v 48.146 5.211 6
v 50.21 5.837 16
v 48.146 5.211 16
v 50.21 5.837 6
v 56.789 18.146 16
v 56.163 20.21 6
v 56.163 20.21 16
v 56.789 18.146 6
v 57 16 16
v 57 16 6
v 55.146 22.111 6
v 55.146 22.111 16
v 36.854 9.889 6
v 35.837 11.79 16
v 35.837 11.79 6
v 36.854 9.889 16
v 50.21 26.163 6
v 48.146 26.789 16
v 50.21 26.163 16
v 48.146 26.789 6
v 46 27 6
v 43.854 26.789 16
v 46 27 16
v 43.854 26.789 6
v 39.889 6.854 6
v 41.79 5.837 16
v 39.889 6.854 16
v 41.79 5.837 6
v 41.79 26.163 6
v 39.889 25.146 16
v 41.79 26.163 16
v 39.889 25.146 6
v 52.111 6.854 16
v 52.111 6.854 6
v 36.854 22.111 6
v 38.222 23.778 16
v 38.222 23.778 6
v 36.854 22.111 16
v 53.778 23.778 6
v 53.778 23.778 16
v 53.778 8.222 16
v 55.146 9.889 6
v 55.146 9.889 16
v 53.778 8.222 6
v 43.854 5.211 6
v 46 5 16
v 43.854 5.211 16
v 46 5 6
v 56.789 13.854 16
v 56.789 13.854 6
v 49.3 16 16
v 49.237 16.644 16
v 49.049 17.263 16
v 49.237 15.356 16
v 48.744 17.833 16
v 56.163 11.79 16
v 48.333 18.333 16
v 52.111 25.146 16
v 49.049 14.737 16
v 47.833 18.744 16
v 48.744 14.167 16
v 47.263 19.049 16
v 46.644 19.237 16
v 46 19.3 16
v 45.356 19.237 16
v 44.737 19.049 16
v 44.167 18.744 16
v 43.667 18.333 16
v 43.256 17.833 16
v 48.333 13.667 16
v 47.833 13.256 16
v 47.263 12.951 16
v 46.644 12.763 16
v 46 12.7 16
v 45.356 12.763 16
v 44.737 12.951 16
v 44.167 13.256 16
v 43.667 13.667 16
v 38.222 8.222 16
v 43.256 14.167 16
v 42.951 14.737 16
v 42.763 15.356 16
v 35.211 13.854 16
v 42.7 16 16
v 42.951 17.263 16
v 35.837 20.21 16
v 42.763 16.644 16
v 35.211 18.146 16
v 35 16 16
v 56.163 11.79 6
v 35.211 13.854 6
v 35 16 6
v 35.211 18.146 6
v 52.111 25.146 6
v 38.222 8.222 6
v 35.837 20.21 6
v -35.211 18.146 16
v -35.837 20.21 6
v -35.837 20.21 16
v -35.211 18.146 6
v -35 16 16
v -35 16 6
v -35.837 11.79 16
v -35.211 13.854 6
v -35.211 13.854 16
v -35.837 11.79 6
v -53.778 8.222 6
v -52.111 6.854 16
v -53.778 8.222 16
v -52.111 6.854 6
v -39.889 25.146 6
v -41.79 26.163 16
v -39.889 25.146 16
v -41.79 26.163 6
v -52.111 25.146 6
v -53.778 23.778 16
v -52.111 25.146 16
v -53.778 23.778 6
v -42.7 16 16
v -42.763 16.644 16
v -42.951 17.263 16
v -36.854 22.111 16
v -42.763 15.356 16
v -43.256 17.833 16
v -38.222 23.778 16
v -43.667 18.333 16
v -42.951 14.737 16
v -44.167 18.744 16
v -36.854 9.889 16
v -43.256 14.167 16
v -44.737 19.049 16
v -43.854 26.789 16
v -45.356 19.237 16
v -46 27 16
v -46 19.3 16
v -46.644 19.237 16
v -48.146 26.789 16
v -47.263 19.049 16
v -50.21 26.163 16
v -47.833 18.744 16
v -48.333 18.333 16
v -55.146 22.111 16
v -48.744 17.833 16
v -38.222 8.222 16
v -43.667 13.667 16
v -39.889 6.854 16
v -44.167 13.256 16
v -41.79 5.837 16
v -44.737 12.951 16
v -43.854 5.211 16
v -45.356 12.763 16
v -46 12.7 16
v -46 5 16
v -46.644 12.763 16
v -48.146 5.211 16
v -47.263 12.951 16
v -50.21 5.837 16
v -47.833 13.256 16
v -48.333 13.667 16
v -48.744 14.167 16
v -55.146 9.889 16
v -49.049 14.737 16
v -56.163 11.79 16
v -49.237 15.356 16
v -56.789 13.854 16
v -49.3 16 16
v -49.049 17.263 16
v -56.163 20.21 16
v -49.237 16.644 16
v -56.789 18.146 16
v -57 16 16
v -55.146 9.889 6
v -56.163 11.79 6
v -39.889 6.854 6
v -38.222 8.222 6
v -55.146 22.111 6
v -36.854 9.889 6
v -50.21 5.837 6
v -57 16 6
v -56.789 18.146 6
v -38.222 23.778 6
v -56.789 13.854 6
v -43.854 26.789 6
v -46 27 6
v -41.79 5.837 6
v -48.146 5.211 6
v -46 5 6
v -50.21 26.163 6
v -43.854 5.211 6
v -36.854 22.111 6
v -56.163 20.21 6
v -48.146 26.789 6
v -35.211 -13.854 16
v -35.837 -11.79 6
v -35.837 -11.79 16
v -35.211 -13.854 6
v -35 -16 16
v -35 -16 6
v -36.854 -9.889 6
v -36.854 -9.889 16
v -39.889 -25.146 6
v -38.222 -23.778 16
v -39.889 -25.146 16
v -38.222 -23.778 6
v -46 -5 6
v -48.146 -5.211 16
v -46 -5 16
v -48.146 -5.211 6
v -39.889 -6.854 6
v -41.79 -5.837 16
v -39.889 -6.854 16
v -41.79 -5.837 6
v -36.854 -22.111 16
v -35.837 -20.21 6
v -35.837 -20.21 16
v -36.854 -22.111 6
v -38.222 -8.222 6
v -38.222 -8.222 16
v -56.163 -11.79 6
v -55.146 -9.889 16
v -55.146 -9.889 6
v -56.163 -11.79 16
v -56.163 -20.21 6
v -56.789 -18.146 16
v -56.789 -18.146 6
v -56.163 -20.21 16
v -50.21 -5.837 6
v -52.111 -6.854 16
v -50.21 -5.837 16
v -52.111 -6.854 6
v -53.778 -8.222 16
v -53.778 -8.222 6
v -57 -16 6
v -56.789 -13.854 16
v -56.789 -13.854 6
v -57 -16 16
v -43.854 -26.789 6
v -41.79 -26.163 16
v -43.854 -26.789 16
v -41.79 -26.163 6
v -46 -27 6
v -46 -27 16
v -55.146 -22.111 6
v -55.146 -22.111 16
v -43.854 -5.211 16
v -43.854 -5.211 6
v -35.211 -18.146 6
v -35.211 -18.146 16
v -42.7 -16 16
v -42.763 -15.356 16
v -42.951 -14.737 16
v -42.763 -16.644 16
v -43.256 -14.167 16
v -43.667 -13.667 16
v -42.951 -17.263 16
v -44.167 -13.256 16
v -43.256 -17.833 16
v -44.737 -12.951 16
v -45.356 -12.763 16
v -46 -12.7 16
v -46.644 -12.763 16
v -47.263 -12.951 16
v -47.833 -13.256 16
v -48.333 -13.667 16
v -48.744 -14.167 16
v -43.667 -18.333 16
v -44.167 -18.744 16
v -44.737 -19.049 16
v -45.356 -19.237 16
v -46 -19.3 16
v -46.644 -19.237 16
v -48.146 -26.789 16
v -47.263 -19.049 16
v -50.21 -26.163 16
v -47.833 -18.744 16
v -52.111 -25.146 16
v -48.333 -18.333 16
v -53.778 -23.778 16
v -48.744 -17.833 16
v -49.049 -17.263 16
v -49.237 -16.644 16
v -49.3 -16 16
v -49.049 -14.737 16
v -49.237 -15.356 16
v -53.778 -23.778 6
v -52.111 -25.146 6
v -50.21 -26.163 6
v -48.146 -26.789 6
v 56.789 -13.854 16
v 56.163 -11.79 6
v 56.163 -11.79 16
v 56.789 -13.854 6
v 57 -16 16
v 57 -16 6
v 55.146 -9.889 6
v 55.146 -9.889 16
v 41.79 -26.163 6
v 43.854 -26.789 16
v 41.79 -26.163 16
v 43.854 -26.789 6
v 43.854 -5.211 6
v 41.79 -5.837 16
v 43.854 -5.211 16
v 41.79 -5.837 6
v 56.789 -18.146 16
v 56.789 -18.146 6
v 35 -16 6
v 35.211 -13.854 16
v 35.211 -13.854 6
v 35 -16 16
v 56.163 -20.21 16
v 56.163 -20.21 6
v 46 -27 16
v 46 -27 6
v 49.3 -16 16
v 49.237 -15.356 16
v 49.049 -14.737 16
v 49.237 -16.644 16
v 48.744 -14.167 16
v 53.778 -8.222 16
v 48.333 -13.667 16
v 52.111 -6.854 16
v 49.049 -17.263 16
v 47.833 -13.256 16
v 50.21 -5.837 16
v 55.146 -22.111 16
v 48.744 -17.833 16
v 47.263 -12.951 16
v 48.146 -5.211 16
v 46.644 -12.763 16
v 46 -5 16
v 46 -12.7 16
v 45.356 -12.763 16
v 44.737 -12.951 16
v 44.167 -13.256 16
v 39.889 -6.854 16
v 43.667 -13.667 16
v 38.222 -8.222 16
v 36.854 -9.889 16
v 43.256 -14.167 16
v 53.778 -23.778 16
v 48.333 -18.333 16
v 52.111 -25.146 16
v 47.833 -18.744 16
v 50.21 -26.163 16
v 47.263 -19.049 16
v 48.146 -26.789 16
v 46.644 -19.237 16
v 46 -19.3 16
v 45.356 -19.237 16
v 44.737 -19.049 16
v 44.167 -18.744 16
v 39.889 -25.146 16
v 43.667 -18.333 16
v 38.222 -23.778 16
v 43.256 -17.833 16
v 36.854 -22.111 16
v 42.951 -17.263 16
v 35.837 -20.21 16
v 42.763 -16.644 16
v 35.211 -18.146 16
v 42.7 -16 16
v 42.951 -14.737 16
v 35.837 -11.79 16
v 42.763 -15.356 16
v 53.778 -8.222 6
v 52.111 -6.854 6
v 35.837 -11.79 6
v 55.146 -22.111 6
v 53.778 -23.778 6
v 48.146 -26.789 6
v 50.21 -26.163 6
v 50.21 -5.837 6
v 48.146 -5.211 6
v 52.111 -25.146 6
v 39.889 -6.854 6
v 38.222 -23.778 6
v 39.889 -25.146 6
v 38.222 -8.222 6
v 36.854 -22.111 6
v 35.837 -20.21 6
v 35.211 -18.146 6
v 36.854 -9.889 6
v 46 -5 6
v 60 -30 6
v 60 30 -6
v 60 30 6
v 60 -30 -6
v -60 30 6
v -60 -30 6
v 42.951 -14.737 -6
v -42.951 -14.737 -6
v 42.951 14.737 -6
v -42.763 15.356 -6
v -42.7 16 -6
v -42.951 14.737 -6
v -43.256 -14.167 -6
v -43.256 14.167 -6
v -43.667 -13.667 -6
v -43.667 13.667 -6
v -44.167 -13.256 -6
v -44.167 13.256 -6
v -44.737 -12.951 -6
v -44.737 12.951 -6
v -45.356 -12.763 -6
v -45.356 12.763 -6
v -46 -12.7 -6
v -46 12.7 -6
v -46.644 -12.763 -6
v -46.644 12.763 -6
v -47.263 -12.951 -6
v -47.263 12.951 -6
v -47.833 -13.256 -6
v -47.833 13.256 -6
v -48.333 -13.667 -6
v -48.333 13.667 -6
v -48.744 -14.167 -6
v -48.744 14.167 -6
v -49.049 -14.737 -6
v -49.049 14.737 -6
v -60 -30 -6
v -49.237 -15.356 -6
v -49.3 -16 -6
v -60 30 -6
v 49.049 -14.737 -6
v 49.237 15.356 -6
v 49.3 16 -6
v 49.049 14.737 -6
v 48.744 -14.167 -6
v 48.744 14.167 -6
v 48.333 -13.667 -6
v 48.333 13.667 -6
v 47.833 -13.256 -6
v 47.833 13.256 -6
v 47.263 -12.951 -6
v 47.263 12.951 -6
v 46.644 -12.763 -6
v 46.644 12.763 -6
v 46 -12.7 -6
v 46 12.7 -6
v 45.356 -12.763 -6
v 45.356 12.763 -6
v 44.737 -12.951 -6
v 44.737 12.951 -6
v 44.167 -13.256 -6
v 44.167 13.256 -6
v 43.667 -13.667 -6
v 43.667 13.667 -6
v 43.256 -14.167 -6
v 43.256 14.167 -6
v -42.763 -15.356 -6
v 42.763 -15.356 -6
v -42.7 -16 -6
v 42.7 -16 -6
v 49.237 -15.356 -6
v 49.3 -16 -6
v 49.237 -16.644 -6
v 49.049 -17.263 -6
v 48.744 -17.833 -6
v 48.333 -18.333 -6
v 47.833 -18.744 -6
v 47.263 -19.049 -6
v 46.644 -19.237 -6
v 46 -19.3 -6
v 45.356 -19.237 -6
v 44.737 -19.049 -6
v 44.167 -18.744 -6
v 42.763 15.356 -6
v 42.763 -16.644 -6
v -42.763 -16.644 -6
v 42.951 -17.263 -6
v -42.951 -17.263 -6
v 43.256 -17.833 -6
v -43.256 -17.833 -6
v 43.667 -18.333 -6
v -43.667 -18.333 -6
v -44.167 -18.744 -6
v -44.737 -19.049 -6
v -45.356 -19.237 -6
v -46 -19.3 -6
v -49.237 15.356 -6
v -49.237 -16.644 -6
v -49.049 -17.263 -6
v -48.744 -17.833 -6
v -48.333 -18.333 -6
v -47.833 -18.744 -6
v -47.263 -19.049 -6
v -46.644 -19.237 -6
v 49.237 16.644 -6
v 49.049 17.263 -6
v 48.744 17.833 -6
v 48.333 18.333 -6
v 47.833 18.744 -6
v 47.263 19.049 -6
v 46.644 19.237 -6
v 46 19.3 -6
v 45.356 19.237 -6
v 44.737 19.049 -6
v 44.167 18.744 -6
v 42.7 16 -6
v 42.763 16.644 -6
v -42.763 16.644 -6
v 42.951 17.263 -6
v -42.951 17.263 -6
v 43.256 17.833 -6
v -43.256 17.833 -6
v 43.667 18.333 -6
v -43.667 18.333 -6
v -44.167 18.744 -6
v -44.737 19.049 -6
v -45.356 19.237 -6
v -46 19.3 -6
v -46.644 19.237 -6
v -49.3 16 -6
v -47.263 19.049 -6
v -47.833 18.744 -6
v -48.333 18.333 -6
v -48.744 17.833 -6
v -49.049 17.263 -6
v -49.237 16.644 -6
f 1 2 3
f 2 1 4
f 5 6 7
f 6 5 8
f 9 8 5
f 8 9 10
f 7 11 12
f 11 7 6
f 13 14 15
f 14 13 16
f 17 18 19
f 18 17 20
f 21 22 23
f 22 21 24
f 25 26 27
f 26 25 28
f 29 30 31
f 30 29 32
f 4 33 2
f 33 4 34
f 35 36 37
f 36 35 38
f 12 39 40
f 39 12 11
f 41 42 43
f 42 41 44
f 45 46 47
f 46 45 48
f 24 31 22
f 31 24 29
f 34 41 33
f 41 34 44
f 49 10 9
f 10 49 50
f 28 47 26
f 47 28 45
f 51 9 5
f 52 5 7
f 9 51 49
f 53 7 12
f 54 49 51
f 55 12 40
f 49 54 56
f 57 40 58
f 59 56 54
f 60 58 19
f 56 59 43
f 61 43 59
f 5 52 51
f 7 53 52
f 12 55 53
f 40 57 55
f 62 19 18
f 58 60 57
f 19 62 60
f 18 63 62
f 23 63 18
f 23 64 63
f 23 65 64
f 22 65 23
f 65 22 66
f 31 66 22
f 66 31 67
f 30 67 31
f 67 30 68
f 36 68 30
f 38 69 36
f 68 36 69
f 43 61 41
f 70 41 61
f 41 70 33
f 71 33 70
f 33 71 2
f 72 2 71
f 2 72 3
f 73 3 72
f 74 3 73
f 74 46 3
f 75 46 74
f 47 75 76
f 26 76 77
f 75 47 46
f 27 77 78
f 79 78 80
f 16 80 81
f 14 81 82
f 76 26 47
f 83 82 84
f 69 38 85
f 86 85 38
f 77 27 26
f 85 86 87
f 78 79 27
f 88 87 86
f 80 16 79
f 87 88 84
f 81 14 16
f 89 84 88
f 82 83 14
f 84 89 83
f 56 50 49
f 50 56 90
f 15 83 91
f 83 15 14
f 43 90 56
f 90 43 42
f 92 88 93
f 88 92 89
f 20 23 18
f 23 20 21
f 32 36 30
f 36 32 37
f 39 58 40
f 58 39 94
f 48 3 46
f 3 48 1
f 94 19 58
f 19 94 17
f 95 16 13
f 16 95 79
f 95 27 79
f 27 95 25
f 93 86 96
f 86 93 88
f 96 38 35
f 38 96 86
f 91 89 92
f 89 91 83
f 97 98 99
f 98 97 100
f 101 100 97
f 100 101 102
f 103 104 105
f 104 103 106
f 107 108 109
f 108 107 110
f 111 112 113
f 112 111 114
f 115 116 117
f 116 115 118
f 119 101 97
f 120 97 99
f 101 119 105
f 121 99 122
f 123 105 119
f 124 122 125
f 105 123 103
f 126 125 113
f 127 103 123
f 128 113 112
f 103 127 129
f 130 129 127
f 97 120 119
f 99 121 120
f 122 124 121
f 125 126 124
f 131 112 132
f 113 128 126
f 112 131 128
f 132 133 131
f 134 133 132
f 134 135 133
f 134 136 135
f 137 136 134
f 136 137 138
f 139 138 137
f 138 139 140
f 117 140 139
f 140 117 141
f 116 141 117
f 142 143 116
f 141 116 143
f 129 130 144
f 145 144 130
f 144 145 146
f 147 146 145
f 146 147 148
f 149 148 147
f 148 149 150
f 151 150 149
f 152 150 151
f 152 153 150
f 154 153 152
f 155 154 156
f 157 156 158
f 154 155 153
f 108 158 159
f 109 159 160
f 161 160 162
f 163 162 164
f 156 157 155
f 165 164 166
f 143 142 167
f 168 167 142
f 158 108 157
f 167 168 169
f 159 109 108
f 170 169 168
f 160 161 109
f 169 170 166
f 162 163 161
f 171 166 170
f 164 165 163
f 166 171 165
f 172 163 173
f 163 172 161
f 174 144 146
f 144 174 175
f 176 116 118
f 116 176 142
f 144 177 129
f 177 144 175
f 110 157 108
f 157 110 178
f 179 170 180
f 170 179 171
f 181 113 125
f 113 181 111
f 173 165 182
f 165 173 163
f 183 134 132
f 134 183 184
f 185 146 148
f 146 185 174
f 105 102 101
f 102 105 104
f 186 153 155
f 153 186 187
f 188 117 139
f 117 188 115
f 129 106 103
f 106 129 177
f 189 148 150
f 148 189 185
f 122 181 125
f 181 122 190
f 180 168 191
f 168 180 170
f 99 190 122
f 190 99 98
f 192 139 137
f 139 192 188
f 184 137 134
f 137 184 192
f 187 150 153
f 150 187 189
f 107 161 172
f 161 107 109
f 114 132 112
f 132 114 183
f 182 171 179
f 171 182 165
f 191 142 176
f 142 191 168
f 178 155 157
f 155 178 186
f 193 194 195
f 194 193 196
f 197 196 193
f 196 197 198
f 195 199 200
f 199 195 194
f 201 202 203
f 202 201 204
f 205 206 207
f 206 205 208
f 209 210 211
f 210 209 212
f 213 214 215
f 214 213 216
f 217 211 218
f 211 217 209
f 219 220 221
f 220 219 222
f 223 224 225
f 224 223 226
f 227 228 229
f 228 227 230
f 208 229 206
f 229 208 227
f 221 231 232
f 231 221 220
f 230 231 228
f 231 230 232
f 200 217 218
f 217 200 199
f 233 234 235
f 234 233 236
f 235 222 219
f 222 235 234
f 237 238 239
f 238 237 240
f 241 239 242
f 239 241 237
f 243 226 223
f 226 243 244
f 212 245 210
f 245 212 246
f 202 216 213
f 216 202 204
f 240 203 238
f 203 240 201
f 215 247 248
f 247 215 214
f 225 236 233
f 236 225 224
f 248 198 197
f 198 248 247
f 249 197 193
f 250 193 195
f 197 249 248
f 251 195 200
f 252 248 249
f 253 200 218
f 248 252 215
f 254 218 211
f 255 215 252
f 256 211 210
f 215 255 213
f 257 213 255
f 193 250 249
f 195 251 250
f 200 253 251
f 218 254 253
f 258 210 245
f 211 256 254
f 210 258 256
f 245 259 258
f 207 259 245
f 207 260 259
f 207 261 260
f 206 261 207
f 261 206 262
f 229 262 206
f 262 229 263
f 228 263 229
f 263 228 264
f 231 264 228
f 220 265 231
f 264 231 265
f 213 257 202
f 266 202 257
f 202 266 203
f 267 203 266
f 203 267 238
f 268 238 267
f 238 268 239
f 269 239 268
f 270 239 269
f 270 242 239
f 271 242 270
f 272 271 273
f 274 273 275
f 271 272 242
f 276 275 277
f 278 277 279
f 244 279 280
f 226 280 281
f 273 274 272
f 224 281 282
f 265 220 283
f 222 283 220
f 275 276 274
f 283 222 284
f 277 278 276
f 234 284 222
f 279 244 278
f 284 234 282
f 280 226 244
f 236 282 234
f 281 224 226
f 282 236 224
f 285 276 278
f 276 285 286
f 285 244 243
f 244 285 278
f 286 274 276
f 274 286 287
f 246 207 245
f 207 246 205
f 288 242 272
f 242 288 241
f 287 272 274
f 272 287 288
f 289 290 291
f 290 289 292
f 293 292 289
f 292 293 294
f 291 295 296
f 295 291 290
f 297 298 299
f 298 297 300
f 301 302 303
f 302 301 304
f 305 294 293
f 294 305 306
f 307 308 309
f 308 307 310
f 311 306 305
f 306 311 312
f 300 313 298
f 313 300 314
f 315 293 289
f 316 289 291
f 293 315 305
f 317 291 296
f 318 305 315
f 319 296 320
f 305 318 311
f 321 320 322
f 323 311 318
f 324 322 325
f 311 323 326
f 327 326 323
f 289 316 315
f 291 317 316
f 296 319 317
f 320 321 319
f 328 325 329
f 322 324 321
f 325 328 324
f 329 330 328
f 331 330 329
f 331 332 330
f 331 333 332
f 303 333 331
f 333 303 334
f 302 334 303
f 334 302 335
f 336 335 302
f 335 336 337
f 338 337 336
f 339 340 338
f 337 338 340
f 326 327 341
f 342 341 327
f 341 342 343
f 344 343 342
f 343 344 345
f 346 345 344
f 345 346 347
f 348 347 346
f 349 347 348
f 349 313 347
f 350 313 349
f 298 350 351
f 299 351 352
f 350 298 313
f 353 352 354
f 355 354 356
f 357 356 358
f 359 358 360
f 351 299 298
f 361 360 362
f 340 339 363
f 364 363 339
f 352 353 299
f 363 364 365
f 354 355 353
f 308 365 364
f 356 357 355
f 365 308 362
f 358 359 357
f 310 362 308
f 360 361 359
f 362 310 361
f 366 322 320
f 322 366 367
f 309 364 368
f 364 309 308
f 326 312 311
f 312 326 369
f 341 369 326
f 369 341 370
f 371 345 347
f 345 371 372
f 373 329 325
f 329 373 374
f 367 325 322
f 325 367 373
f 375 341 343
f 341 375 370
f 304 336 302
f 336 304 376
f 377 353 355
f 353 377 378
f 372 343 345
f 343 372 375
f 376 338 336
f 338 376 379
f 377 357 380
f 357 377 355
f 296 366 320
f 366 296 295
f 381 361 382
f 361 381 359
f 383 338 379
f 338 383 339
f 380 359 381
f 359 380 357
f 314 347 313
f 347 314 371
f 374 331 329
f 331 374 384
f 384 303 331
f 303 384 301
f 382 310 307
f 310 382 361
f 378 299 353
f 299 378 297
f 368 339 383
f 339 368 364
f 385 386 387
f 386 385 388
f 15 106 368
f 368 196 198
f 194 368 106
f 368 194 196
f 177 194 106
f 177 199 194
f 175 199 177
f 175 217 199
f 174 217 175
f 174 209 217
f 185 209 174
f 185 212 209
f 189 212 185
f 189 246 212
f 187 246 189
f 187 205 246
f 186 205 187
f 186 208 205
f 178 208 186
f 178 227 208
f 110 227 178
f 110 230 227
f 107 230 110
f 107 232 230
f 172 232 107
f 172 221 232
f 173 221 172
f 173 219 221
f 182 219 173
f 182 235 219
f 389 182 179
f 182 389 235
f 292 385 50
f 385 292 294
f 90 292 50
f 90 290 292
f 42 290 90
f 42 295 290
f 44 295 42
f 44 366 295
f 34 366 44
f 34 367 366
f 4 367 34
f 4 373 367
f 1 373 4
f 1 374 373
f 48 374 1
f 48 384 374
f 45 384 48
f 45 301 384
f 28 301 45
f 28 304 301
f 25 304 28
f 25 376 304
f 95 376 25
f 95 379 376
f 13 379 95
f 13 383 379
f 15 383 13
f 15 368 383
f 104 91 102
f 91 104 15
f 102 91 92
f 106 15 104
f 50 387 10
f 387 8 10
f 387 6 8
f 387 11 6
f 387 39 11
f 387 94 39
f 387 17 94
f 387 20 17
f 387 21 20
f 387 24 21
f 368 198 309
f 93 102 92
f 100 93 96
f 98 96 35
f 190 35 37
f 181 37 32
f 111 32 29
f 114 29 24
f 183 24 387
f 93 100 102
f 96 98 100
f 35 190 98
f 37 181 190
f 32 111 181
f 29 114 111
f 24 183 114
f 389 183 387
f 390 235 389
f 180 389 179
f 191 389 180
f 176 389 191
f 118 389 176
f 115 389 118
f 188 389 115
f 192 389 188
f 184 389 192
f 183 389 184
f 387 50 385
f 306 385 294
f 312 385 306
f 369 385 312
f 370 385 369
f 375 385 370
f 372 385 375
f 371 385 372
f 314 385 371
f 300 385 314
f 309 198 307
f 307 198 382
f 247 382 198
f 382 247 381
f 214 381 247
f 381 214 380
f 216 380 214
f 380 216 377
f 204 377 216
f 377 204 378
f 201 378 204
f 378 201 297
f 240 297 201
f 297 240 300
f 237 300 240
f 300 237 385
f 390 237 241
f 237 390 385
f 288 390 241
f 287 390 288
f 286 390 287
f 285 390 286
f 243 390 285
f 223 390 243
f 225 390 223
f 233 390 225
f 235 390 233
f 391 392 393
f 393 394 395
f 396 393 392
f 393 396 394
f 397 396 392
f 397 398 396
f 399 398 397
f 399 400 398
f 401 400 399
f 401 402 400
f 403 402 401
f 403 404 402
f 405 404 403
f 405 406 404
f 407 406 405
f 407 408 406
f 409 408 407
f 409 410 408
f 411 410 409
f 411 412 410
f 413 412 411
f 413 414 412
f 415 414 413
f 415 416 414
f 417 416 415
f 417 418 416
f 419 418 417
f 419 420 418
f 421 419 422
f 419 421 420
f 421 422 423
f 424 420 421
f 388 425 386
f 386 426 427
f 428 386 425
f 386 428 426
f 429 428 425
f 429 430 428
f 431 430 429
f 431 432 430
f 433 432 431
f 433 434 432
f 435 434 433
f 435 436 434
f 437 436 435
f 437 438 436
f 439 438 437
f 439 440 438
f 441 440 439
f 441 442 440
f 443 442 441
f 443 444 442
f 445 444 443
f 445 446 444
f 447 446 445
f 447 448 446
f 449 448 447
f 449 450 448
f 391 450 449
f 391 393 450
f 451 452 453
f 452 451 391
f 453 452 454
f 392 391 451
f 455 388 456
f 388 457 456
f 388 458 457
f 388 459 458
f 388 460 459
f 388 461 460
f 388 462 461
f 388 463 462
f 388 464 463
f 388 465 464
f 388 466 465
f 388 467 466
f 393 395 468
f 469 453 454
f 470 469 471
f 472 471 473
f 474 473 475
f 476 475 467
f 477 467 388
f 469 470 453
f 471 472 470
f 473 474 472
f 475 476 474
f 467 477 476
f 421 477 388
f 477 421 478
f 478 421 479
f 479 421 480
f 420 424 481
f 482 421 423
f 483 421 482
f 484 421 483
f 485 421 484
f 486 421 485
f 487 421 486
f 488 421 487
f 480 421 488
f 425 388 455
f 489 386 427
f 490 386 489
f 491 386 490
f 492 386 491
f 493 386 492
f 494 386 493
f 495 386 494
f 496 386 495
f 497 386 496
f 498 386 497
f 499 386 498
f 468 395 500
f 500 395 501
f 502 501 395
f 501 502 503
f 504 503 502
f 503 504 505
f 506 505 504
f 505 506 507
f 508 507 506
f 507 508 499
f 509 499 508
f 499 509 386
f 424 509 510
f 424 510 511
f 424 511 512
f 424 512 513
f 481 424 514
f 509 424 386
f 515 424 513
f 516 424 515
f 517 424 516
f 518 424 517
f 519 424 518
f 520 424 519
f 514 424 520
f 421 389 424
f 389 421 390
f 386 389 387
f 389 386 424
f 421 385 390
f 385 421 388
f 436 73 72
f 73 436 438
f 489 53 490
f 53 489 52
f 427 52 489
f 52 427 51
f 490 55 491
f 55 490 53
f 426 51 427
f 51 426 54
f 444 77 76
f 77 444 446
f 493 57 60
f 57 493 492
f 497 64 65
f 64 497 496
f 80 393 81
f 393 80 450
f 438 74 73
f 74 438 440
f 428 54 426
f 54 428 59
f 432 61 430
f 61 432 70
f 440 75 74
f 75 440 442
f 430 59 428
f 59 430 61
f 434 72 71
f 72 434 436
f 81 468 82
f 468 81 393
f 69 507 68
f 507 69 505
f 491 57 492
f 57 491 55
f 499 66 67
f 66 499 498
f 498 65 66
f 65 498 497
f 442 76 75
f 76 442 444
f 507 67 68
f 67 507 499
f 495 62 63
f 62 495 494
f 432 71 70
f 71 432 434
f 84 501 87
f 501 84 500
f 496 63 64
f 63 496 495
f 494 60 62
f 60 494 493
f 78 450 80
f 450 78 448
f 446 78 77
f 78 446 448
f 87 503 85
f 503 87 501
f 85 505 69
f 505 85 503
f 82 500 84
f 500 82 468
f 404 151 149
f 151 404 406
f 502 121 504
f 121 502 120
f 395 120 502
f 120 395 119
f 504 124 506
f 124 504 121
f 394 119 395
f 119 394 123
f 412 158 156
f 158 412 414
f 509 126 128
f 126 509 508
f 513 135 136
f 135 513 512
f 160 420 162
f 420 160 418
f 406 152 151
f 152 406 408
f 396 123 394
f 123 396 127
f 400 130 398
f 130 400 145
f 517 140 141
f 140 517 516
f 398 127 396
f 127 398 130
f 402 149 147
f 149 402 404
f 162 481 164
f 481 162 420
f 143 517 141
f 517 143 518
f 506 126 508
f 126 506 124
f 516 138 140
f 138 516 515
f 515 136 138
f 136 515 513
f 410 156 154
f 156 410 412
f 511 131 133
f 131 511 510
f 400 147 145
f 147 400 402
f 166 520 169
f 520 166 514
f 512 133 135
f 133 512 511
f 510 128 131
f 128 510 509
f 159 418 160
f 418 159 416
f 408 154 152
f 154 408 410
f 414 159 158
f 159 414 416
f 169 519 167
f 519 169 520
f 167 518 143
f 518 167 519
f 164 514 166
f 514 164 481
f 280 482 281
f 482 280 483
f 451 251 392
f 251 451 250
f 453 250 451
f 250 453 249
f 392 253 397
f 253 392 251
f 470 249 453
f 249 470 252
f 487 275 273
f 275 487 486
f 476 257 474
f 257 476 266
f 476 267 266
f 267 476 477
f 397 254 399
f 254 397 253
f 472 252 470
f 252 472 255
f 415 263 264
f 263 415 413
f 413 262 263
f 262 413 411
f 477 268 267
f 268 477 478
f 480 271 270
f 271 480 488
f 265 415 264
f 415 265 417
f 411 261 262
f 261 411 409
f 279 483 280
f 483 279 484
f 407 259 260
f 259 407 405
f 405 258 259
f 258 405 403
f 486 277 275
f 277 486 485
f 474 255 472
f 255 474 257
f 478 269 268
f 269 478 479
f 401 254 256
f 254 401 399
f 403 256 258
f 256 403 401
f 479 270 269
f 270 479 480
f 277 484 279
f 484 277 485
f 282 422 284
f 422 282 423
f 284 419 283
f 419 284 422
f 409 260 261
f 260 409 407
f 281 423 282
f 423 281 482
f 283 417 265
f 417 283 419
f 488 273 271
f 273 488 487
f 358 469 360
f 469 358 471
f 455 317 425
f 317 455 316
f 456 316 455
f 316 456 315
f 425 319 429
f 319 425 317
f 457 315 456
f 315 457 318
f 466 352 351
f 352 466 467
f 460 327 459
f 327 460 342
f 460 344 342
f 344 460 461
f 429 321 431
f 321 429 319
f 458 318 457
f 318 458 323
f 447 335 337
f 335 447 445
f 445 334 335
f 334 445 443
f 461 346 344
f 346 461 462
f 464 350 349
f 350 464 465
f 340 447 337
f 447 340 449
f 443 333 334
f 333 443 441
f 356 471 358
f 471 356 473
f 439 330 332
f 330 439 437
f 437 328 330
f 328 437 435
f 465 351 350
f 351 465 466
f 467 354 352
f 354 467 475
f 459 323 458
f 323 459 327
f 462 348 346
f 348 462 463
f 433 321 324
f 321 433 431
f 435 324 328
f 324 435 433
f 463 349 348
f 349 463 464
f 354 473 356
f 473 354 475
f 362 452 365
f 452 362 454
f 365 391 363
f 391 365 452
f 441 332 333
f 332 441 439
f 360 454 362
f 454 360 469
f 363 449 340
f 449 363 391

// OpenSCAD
$fn = 32;

// ----------------------------------------------------------------------
// Anchor pads 120 x 60 x 22
// four corner bosses with anchor holes
// ----------------------------------------------------------------------

// --- parameters (mm) ---
plate = [120, 60, 12];  // base plate size (x, y, z)
pads = 4;               // boss count, one per corner
edge = 14;              // boss centre offset from the plate edge
boss_d = 22;            // boss diameter
boss_h = 10;            // boss height above the base plate
hole_d = 6.6;           // hole diameter

// --- derived feature positions (mm) ---
height = plate[2] + boss_h;      // = 22   overall height of the part
corner_x = plate[0] / 2 - edge;  // = 46   boss centre X
corner_y = plate[1] / 2 - edge;  // = 16   boss centre Y
feature_centers = [
  [corner_x, corner_y],
  [-corner_x, corner_y],
  [-corner_x, -corner_y],
  [corner_x, -corner_y]
];   // boss centres, anchor holes are drilled there

// base plate, four bosses standing on it, anchor holes all the way through
difference() {
  union() {
    cube(plate, center = true);
    for (centre = feature_centers)
      translate([centre[0], centre[1], plate[2] / 2 - 1])
        cylinder(d = boss_d, h = boss_h + 1);
  }
  for (centre = feature_centers)
    translate([centre[0], centre[1], -height])
      cylinder(d = hole_d, h = 2 * height + 2);  // through boss and plate
}
